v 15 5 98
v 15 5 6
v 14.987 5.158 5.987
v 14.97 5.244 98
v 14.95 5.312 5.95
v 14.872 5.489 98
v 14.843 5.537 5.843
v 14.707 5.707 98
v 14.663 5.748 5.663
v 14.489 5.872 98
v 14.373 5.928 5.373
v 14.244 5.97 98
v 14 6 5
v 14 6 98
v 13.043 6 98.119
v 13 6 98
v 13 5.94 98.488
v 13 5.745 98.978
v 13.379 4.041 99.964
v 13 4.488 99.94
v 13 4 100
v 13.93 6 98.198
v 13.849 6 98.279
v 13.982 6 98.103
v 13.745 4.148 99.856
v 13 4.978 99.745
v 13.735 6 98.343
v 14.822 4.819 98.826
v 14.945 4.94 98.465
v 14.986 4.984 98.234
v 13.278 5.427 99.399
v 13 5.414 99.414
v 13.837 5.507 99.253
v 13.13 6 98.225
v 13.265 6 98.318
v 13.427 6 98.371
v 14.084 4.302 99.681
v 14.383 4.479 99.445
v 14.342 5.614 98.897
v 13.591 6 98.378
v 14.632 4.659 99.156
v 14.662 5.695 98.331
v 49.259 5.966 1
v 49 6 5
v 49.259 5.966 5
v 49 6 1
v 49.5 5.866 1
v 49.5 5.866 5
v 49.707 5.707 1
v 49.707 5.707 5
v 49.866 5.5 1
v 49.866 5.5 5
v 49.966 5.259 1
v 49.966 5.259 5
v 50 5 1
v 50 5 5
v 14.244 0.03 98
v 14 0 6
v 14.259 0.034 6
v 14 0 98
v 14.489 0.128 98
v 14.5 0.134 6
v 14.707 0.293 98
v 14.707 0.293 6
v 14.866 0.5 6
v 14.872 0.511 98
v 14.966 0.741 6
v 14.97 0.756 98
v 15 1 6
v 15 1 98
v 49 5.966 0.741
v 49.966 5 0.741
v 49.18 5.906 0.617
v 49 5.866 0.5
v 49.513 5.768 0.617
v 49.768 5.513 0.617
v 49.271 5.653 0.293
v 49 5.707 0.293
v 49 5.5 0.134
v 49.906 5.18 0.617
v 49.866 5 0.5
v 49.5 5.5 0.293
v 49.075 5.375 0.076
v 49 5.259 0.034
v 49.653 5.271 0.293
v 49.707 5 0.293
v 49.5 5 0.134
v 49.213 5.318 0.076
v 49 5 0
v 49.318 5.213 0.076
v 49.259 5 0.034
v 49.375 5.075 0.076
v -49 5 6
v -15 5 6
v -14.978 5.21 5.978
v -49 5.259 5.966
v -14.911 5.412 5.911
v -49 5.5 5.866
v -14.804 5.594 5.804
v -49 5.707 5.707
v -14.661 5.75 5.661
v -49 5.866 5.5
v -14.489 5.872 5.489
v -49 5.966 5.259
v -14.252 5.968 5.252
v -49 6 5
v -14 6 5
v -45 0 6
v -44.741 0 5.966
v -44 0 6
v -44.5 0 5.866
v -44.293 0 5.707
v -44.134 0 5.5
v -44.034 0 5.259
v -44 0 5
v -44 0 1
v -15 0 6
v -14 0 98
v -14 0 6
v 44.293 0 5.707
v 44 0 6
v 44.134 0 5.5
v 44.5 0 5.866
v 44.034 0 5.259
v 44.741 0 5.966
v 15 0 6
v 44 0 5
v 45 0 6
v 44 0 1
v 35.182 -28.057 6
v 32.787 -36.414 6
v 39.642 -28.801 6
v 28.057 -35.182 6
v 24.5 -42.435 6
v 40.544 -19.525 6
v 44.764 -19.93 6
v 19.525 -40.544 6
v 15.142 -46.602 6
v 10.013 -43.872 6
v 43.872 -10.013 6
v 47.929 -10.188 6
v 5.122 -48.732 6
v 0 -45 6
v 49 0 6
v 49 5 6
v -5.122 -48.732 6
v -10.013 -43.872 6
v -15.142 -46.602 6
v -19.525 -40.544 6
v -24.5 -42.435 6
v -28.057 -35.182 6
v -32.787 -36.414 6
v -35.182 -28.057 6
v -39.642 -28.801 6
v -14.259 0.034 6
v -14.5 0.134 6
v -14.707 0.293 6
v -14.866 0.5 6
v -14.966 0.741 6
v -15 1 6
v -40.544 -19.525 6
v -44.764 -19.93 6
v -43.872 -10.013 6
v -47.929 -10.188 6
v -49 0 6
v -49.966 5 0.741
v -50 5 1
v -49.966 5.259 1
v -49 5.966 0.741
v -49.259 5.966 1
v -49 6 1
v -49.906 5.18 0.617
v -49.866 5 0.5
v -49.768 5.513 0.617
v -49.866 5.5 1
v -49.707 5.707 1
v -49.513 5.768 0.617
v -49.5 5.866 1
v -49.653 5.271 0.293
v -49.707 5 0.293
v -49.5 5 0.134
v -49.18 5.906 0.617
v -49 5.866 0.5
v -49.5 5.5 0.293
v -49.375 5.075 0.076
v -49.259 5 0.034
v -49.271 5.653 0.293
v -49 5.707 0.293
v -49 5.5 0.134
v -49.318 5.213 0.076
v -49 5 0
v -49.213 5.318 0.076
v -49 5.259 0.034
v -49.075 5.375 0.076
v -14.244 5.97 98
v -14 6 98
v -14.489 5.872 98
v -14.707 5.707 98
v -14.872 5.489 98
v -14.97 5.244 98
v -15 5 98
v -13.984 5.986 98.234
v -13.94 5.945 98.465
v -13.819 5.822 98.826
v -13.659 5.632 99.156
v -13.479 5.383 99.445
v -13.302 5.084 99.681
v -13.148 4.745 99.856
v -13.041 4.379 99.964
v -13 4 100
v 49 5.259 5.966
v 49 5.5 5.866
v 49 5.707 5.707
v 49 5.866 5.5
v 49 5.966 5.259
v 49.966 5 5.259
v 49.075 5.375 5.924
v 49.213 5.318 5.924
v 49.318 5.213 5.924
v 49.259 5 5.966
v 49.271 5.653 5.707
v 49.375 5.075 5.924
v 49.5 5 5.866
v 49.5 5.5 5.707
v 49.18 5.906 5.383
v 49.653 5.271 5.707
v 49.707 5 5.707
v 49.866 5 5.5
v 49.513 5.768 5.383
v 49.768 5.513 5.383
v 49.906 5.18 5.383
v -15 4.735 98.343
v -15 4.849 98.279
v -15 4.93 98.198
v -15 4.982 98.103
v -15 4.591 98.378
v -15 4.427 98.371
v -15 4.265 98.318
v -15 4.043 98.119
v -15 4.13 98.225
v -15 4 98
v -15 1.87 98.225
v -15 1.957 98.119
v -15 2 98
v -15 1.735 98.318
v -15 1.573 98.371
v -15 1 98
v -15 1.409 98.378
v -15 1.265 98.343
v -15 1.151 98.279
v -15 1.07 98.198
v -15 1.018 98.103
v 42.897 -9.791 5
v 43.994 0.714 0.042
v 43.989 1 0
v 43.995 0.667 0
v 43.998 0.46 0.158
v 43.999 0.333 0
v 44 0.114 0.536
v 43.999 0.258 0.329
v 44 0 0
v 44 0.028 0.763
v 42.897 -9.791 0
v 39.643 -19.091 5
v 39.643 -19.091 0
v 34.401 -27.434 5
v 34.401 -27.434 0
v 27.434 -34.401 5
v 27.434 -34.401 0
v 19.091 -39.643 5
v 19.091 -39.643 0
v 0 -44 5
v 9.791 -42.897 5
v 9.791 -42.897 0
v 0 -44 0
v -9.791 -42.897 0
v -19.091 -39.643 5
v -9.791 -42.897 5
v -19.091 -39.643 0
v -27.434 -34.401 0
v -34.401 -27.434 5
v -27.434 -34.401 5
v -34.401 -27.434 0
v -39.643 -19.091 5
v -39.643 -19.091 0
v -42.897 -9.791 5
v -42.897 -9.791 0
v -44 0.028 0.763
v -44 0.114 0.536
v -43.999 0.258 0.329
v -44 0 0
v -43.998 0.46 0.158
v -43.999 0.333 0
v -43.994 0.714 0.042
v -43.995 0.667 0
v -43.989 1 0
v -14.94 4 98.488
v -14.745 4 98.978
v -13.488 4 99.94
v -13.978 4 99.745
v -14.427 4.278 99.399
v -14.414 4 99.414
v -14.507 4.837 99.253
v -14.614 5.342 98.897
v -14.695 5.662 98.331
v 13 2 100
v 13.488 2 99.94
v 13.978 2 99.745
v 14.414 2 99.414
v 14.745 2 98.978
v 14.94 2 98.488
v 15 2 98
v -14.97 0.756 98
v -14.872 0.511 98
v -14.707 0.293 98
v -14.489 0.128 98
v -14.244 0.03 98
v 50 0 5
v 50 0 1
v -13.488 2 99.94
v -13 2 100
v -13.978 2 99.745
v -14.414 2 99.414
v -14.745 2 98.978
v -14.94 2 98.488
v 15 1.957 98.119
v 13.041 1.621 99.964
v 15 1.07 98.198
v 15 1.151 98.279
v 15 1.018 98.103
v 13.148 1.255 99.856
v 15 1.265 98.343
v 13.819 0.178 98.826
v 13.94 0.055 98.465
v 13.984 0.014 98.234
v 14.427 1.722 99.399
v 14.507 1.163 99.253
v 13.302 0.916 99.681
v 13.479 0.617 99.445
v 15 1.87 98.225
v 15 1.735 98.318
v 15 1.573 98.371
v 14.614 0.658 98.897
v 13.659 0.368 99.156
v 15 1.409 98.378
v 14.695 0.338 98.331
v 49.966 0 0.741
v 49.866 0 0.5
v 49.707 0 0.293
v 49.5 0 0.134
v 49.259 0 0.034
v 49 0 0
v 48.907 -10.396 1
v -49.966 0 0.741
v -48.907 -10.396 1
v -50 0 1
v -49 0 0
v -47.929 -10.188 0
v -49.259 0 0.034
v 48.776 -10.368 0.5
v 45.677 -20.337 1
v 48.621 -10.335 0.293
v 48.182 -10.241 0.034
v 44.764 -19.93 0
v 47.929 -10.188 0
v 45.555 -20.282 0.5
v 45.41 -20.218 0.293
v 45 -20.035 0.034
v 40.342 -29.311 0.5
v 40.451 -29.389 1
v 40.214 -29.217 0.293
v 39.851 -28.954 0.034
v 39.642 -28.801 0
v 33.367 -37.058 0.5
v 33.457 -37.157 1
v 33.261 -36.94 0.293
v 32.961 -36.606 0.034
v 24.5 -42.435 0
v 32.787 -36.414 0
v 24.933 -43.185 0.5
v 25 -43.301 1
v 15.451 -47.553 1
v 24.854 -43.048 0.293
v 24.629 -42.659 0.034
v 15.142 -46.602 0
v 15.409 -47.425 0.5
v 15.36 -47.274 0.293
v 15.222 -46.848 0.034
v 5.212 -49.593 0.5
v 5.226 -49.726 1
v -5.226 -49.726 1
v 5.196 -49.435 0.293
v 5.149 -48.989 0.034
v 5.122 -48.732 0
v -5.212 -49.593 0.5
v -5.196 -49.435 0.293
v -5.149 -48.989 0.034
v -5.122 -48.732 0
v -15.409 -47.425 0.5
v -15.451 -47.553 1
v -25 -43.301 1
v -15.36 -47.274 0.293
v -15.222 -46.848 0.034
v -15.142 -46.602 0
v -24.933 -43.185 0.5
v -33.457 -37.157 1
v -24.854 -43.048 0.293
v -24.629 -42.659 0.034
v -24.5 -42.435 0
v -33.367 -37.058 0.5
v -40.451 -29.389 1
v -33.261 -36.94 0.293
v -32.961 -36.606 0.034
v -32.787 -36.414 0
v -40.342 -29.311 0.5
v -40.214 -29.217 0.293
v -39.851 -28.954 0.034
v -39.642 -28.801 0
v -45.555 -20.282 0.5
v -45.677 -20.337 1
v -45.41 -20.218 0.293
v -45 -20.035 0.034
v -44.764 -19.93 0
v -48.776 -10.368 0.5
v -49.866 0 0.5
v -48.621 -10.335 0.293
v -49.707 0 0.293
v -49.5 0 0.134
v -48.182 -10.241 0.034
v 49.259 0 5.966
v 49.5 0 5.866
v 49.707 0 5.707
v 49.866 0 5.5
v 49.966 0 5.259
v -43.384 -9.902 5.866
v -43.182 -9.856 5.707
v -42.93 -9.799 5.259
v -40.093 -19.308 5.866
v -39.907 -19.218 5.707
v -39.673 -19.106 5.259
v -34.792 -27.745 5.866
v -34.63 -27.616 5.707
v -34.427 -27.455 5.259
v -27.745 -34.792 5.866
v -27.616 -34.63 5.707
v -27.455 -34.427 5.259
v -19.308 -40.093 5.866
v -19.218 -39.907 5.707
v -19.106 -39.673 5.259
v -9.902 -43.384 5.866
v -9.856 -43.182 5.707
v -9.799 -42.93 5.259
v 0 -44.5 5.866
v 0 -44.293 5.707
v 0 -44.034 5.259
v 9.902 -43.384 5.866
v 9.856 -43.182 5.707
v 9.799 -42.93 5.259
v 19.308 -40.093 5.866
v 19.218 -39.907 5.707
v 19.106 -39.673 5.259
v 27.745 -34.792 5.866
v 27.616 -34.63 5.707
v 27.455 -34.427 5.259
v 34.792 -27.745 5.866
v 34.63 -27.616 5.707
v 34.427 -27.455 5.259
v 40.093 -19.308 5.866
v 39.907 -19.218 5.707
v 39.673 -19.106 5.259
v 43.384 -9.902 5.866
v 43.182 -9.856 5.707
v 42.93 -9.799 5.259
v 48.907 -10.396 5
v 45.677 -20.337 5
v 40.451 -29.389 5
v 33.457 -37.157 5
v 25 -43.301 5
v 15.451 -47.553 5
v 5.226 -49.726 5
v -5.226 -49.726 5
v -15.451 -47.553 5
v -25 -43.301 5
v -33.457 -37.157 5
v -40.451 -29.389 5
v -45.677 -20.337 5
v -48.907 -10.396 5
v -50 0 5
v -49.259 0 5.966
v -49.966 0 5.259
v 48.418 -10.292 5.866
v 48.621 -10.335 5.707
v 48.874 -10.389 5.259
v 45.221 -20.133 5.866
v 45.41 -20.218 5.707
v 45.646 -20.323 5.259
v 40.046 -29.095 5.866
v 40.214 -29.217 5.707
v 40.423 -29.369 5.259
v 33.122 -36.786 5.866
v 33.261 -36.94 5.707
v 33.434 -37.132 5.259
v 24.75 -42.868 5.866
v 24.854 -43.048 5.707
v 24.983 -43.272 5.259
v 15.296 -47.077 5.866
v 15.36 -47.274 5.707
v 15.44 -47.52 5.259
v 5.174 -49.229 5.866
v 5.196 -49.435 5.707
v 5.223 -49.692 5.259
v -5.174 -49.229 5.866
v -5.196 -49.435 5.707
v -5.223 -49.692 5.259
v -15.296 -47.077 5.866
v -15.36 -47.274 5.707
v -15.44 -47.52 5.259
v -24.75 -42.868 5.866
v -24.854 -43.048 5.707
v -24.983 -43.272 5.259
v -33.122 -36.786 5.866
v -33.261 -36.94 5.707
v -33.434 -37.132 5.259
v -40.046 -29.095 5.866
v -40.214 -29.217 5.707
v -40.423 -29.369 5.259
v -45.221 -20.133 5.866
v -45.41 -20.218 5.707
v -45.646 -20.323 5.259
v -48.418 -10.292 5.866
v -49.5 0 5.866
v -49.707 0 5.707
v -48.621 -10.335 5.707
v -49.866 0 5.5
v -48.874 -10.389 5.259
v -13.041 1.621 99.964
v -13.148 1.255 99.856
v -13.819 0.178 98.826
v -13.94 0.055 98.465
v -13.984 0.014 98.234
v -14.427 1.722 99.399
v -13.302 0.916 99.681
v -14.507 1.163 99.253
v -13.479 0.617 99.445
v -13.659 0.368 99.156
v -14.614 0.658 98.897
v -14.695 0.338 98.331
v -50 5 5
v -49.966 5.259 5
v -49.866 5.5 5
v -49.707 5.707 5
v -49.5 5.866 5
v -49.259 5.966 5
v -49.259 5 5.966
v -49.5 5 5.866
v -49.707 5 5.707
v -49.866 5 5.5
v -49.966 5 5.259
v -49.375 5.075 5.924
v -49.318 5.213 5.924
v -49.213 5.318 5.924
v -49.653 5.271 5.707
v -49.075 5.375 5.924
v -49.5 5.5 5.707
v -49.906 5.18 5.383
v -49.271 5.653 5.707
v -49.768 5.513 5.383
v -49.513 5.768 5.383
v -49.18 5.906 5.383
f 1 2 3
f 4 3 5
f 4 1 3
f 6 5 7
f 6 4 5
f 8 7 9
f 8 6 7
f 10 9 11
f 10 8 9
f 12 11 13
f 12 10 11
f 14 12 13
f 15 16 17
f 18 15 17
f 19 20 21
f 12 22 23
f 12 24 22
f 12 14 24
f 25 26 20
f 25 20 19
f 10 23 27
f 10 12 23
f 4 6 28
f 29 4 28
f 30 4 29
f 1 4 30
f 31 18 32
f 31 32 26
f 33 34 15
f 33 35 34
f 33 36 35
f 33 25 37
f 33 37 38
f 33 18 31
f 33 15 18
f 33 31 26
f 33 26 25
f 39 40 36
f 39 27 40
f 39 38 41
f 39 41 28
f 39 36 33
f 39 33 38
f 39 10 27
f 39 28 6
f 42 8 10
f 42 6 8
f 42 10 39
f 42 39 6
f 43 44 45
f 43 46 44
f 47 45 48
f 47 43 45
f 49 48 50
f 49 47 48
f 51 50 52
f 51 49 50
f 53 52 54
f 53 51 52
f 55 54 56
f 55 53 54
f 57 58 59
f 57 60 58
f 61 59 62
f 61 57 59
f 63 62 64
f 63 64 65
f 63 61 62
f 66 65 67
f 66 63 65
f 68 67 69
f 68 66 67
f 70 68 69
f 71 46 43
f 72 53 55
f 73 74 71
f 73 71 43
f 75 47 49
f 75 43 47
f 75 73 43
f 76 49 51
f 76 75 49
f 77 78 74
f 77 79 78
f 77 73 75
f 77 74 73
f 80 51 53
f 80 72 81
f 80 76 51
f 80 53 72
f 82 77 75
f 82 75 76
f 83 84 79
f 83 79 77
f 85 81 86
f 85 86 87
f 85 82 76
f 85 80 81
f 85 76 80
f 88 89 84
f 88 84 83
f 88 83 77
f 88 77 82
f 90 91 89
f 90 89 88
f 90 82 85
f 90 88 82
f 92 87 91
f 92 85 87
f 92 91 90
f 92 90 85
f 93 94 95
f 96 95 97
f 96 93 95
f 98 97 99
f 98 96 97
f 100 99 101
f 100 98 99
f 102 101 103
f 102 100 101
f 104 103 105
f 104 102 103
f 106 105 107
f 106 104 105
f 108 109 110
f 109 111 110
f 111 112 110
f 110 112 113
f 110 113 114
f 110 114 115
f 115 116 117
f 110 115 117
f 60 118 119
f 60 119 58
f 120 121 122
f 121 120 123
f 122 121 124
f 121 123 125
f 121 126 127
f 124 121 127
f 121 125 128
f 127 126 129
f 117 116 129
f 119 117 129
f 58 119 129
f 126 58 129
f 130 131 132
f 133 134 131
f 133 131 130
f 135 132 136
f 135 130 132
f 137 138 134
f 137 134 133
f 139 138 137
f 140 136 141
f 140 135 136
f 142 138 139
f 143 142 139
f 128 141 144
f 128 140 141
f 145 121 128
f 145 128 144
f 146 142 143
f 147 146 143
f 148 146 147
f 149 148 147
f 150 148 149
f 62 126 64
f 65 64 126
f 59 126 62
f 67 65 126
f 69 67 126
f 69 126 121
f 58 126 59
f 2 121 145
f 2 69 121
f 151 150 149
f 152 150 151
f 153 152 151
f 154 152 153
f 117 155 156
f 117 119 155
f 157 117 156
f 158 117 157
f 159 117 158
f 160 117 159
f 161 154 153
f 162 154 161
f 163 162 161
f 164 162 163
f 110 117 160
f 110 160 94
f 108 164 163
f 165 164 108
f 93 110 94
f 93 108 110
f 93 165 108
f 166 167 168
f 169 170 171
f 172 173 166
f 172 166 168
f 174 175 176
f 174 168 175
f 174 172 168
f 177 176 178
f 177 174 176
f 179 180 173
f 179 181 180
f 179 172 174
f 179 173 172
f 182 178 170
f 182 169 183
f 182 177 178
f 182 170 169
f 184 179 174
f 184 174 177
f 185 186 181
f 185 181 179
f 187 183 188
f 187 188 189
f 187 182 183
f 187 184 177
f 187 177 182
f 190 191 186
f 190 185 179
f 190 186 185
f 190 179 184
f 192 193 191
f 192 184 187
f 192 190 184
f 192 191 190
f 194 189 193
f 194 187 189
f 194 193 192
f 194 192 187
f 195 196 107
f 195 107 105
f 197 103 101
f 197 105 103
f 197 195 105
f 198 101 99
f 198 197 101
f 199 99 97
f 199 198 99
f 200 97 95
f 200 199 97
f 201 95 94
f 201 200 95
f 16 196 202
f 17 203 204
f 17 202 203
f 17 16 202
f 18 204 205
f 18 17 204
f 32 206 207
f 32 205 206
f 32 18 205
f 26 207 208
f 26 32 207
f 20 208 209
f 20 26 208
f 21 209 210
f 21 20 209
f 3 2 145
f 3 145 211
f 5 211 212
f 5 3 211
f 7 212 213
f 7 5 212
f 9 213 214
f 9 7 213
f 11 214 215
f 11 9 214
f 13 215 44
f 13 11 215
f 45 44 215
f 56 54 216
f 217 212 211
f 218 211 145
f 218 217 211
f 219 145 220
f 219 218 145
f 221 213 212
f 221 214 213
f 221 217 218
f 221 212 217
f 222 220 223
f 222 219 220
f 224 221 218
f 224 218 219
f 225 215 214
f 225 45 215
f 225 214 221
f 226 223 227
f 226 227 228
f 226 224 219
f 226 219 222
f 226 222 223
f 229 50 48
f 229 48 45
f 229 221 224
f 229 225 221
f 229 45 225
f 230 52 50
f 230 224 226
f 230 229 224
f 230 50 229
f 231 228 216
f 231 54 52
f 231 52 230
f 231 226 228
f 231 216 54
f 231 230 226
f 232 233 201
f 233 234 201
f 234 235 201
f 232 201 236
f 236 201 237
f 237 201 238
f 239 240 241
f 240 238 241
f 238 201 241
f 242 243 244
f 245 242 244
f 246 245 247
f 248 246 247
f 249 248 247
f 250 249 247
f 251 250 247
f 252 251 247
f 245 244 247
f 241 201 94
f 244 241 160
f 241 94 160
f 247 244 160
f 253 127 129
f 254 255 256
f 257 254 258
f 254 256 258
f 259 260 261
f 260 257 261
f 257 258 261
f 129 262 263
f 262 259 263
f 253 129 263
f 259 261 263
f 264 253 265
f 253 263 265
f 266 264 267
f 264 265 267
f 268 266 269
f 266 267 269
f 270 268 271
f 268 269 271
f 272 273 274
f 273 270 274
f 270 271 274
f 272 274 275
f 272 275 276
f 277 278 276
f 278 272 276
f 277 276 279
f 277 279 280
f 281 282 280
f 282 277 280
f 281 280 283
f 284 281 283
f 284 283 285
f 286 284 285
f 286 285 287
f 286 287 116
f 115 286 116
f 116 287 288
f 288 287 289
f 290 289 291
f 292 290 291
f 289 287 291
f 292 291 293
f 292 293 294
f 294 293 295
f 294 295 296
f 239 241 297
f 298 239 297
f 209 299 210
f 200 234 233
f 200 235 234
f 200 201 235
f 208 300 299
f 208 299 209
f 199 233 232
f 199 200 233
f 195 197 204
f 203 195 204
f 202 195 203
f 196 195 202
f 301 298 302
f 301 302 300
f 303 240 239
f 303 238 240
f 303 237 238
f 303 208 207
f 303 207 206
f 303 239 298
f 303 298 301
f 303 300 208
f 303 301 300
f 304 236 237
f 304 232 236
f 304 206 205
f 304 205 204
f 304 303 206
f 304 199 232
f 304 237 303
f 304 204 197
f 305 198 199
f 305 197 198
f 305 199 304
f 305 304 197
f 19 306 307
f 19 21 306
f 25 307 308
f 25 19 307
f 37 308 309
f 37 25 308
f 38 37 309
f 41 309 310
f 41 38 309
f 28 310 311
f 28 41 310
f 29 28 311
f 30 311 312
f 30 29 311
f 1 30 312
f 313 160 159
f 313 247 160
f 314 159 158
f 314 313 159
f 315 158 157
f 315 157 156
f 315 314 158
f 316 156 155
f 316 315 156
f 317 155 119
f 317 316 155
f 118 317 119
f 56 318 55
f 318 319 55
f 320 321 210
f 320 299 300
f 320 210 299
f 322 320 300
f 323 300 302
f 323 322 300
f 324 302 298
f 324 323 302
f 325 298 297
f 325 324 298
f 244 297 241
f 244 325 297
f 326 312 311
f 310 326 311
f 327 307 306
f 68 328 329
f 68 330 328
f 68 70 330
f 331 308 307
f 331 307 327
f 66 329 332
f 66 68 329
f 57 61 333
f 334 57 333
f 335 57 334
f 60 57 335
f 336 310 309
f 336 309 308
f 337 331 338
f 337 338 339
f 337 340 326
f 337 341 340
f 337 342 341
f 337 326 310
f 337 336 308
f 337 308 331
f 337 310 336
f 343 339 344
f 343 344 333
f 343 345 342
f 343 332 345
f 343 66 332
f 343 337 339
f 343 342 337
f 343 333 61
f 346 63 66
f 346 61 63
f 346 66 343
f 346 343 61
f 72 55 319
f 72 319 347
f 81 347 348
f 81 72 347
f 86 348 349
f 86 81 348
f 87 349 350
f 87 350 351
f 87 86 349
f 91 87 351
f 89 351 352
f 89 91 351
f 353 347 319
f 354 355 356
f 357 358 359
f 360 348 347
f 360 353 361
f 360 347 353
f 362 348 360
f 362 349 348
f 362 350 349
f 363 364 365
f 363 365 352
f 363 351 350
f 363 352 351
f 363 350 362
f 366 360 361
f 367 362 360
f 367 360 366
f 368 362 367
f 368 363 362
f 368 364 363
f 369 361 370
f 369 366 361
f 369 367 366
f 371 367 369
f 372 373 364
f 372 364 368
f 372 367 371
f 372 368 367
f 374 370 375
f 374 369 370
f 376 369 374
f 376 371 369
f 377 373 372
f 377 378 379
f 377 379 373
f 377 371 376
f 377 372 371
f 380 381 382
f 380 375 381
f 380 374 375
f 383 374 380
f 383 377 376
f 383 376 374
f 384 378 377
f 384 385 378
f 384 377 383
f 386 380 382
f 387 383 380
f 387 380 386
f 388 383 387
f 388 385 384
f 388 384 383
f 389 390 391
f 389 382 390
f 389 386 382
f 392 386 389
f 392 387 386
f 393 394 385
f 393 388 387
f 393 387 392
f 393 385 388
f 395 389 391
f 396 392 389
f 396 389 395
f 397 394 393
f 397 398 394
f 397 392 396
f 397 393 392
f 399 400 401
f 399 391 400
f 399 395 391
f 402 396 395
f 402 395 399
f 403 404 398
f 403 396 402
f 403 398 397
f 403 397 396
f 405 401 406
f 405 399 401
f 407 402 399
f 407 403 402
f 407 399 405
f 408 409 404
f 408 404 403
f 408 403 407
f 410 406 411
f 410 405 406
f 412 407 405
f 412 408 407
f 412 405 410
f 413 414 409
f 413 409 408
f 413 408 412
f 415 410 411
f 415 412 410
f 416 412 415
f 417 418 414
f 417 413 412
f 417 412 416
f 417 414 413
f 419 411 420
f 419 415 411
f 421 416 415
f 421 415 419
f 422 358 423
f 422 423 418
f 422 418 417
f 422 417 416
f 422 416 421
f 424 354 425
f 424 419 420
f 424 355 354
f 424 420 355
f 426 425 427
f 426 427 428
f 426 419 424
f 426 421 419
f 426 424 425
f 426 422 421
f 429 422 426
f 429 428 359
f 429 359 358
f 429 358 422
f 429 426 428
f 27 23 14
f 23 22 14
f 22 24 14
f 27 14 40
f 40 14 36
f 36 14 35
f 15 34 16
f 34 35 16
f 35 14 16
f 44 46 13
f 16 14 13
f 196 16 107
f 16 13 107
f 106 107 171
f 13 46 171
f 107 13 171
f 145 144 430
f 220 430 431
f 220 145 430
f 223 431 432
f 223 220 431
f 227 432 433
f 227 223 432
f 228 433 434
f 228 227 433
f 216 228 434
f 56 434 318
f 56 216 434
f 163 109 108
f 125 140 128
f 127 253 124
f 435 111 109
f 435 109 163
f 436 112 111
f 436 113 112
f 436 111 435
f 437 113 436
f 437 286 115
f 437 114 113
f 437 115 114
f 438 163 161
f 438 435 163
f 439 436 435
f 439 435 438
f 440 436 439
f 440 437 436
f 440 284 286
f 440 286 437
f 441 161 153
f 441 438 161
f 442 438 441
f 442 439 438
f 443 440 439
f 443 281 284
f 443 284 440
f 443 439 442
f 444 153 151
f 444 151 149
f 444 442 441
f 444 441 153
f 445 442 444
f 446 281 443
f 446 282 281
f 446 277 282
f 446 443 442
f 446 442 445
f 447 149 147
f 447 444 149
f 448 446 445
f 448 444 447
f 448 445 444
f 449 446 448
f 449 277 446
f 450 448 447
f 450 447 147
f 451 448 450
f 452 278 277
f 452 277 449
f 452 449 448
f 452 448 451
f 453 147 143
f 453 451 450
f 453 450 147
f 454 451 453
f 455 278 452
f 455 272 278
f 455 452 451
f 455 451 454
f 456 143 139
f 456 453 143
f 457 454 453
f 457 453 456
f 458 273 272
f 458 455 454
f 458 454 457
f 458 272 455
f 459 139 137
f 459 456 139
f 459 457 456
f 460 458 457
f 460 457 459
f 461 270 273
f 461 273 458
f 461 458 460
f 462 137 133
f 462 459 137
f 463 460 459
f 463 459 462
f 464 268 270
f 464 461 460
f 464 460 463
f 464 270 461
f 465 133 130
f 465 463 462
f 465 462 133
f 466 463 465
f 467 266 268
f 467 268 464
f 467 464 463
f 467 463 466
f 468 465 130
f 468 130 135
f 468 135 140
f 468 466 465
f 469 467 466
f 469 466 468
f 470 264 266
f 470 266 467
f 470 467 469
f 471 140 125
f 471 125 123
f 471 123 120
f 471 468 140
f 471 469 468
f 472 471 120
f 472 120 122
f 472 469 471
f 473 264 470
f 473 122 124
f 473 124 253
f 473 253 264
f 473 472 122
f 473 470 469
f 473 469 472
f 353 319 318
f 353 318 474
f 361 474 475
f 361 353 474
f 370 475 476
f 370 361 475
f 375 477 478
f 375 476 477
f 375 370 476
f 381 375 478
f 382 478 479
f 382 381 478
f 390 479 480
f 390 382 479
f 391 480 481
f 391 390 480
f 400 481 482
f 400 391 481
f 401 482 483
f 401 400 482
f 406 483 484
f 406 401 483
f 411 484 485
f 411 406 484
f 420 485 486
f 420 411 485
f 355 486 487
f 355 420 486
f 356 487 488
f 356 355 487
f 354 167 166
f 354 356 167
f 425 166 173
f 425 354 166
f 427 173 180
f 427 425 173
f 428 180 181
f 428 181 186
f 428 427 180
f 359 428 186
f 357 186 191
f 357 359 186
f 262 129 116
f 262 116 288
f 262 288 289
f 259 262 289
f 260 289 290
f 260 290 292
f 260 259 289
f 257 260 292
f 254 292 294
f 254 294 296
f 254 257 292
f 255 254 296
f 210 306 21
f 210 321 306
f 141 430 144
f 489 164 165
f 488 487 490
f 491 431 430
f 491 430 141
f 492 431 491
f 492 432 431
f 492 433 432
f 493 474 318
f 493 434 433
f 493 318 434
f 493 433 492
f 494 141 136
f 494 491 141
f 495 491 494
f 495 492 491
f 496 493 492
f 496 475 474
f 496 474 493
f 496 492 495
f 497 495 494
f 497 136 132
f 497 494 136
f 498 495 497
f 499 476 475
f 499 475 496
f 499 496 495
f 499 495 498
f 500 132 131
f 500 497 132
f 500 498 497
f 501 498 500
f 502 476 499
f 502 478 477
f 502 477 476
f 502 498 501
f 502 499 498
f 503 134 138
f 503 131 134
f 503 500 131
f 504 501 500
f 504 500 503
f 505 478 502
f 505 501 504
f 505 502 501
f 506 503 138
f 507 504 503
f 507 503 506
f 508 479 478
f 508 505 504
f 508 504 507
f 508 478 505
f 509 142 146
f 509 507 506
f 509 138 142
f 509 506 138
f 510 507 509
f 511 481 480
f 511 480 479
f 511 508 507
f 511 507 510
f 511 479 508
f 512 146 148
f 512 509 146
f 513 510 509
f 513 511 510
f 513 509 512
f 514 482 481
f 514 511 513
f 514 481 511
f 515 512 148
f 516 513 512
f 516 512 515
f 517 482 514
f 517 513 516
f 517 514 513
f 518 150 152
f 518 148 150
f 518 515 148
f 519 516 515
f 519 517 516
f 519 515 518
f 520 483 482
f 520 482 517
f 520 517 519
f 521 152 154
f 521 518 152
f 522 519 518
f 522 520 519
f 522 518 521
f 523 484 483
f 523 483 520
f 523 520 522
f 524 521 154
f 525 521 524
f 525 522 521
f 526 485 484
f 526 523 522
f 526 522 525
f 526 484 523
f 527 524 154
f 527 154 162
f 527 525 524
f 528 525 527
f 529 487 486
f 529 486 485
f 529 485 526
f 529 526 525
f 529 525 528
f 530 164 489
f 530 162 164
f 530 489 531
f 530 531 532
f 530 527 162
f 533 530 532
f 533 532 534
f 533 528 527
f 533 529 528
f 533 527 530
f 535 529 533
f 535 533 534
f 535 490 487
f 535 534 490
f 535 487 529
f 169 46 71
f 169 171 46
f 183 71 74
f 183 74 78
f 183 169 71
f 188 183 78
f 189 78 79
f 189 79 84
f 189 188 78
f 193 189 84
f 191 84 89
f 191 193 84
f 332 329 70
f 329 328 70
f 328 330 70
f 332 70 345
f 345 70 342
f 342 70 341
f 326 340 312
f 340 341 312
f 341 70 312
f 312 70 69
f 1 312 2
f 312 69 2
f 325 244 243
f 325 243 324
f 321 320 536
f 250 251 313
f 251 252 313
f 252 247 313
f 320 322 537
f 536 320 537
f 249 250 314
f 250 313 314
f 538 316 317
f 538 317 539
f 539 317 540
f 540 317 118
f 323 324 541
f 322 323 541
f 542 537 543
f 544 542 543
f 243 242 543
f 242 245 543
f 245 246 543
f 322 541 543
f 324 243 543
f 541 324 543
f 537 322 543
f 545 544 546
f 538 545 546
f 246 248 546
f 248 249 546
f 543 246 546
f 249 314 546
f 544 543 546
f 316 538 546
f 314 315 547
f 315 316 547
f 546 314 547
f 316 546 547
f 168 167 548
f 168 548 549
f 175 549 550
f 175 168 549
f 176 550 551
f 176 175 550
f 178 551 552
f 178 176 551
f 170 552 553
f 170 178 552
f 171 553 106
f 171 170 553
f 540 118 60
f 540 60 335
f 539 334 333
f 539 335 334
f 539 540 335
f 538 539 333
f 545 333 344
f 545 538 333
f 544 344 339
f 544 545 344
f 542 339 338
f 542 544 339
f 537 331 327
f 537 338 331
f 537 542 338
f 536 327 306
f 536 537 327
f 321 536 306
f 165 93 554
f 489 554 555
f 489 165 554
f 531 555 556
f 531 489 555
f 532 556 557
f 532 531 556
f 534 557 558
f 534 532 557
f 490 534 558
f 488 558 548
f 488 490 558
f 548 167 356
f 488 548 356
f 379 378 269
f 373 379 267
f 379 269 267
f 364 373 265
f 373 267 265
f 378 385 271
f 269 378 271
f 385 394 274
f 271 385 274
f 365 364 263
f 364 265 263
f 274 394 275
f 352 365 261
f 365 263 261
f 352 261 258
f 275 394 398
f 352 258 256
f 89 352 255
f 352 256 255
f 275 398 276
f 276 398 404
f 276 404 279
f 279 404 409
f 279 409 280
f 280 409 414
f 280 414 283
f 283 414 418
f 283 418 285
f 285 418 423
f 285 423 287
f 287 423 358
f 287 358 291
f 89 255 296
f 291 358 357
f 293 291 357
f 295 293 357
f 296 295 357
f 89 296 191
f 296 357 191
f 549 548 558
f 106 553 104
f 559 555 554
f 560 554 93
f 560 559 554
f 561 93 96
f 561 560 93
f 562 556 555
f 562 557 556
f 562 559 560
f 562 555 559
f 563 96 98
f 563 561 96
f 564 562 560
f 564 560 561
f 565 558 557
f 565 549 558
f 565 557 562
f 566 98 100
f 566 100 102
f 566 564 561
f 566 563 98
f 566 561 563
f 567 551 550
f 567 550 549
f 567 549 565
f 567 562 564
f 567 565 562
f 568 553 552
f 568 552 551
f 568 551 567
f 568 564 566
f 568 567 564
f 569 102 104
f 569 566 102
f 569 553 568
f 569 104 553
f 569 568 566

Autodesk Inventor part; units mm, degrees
ref_plane "YZ Plane" through (0, 0, 0) normal (1, 0, 0) x (0, 1, 0)
ref_plane "XZ Plane" through (0, 0, 0) normal (0, 1, 0) x (-1, 0, 0)
ref_plane "XY Plane" through (0, 0, 0) normal (0, 0, 1) x (1, 0, 0)
sketch "Sketch1" plane through (0, 0, 0) normal (0, 0, 1) x (0, 1, 0)
  line L0 (0, 15) -> (0, -15)
  line L1 (0, -15) -> (6, -15)
  line L2 (6, -15) -> (6, 15)
  line L3 (6, 15) -> (0, 15)
  line L4 (5, 50) -> (0, 50)
  line L5 (0, 50) -> (0, -50)
  line L6 (0, -50) -> (5, -50)
  line L7 (6, -49) -> (6, 49)
  line L8 (-61.2414, 0) -> (17.4485, 0) projected
  arc A0 (0, 50) -> (0, -50) centre (0, 0) ccw
  arc A1 (0, 44) -> (0, -44) centre (0, 0) ccw
  arc A2 (6, 49) -> (5, 50) centre (5, 49) ccw
  arc A3 (5, -50) -> (6, -49) centre (5, -49) ccw
  dimension "d0" = 30
  dimension "d1" = 6
  dimension "d4" = 100
  dimension "d5" = 6
  dimension "d6" = 1
extrude "Extrusion1" add sketch "Sketch1" along normal blind 100 contours L3 L2 L8 L0 | L8 L2 L1 L0
extrude "Extrusion2" add sketch "Sketch1" along normal blind 6 contours L5 L4 A2 L7 L3 | A1 L8 A0 L5 | L1 L7 A3 L6 L5 | A1 L5 A0 L8
fillet "Fillet1" radius 2 4 edges at (0, 0, 100) (15, 3, 100) (0, 6, 100) (-15, 3, 100)
fillet "Fillet1" radius 1 19 edges at (-15, 0, 53) (-15, 6, 53) (0, 6, 0) (15, 6, 53) (15, 0, 53) (0, 0, 0) (-49.7071, 5.7071, 0) (-50, 2.5, 0) (0, -50, 0) (50, 2.5, 0) (49.7071, 5.7071, 0) (0, -50, 6) (0, -44, 6) (-50, 2.5, 6) (-49.7071, 5.7071, 6) (49.7071, 5.7071, 6) (50, 2.5, 6) (32, 6, 6) (-32, 6, 6)
properties part number "band_stand"
